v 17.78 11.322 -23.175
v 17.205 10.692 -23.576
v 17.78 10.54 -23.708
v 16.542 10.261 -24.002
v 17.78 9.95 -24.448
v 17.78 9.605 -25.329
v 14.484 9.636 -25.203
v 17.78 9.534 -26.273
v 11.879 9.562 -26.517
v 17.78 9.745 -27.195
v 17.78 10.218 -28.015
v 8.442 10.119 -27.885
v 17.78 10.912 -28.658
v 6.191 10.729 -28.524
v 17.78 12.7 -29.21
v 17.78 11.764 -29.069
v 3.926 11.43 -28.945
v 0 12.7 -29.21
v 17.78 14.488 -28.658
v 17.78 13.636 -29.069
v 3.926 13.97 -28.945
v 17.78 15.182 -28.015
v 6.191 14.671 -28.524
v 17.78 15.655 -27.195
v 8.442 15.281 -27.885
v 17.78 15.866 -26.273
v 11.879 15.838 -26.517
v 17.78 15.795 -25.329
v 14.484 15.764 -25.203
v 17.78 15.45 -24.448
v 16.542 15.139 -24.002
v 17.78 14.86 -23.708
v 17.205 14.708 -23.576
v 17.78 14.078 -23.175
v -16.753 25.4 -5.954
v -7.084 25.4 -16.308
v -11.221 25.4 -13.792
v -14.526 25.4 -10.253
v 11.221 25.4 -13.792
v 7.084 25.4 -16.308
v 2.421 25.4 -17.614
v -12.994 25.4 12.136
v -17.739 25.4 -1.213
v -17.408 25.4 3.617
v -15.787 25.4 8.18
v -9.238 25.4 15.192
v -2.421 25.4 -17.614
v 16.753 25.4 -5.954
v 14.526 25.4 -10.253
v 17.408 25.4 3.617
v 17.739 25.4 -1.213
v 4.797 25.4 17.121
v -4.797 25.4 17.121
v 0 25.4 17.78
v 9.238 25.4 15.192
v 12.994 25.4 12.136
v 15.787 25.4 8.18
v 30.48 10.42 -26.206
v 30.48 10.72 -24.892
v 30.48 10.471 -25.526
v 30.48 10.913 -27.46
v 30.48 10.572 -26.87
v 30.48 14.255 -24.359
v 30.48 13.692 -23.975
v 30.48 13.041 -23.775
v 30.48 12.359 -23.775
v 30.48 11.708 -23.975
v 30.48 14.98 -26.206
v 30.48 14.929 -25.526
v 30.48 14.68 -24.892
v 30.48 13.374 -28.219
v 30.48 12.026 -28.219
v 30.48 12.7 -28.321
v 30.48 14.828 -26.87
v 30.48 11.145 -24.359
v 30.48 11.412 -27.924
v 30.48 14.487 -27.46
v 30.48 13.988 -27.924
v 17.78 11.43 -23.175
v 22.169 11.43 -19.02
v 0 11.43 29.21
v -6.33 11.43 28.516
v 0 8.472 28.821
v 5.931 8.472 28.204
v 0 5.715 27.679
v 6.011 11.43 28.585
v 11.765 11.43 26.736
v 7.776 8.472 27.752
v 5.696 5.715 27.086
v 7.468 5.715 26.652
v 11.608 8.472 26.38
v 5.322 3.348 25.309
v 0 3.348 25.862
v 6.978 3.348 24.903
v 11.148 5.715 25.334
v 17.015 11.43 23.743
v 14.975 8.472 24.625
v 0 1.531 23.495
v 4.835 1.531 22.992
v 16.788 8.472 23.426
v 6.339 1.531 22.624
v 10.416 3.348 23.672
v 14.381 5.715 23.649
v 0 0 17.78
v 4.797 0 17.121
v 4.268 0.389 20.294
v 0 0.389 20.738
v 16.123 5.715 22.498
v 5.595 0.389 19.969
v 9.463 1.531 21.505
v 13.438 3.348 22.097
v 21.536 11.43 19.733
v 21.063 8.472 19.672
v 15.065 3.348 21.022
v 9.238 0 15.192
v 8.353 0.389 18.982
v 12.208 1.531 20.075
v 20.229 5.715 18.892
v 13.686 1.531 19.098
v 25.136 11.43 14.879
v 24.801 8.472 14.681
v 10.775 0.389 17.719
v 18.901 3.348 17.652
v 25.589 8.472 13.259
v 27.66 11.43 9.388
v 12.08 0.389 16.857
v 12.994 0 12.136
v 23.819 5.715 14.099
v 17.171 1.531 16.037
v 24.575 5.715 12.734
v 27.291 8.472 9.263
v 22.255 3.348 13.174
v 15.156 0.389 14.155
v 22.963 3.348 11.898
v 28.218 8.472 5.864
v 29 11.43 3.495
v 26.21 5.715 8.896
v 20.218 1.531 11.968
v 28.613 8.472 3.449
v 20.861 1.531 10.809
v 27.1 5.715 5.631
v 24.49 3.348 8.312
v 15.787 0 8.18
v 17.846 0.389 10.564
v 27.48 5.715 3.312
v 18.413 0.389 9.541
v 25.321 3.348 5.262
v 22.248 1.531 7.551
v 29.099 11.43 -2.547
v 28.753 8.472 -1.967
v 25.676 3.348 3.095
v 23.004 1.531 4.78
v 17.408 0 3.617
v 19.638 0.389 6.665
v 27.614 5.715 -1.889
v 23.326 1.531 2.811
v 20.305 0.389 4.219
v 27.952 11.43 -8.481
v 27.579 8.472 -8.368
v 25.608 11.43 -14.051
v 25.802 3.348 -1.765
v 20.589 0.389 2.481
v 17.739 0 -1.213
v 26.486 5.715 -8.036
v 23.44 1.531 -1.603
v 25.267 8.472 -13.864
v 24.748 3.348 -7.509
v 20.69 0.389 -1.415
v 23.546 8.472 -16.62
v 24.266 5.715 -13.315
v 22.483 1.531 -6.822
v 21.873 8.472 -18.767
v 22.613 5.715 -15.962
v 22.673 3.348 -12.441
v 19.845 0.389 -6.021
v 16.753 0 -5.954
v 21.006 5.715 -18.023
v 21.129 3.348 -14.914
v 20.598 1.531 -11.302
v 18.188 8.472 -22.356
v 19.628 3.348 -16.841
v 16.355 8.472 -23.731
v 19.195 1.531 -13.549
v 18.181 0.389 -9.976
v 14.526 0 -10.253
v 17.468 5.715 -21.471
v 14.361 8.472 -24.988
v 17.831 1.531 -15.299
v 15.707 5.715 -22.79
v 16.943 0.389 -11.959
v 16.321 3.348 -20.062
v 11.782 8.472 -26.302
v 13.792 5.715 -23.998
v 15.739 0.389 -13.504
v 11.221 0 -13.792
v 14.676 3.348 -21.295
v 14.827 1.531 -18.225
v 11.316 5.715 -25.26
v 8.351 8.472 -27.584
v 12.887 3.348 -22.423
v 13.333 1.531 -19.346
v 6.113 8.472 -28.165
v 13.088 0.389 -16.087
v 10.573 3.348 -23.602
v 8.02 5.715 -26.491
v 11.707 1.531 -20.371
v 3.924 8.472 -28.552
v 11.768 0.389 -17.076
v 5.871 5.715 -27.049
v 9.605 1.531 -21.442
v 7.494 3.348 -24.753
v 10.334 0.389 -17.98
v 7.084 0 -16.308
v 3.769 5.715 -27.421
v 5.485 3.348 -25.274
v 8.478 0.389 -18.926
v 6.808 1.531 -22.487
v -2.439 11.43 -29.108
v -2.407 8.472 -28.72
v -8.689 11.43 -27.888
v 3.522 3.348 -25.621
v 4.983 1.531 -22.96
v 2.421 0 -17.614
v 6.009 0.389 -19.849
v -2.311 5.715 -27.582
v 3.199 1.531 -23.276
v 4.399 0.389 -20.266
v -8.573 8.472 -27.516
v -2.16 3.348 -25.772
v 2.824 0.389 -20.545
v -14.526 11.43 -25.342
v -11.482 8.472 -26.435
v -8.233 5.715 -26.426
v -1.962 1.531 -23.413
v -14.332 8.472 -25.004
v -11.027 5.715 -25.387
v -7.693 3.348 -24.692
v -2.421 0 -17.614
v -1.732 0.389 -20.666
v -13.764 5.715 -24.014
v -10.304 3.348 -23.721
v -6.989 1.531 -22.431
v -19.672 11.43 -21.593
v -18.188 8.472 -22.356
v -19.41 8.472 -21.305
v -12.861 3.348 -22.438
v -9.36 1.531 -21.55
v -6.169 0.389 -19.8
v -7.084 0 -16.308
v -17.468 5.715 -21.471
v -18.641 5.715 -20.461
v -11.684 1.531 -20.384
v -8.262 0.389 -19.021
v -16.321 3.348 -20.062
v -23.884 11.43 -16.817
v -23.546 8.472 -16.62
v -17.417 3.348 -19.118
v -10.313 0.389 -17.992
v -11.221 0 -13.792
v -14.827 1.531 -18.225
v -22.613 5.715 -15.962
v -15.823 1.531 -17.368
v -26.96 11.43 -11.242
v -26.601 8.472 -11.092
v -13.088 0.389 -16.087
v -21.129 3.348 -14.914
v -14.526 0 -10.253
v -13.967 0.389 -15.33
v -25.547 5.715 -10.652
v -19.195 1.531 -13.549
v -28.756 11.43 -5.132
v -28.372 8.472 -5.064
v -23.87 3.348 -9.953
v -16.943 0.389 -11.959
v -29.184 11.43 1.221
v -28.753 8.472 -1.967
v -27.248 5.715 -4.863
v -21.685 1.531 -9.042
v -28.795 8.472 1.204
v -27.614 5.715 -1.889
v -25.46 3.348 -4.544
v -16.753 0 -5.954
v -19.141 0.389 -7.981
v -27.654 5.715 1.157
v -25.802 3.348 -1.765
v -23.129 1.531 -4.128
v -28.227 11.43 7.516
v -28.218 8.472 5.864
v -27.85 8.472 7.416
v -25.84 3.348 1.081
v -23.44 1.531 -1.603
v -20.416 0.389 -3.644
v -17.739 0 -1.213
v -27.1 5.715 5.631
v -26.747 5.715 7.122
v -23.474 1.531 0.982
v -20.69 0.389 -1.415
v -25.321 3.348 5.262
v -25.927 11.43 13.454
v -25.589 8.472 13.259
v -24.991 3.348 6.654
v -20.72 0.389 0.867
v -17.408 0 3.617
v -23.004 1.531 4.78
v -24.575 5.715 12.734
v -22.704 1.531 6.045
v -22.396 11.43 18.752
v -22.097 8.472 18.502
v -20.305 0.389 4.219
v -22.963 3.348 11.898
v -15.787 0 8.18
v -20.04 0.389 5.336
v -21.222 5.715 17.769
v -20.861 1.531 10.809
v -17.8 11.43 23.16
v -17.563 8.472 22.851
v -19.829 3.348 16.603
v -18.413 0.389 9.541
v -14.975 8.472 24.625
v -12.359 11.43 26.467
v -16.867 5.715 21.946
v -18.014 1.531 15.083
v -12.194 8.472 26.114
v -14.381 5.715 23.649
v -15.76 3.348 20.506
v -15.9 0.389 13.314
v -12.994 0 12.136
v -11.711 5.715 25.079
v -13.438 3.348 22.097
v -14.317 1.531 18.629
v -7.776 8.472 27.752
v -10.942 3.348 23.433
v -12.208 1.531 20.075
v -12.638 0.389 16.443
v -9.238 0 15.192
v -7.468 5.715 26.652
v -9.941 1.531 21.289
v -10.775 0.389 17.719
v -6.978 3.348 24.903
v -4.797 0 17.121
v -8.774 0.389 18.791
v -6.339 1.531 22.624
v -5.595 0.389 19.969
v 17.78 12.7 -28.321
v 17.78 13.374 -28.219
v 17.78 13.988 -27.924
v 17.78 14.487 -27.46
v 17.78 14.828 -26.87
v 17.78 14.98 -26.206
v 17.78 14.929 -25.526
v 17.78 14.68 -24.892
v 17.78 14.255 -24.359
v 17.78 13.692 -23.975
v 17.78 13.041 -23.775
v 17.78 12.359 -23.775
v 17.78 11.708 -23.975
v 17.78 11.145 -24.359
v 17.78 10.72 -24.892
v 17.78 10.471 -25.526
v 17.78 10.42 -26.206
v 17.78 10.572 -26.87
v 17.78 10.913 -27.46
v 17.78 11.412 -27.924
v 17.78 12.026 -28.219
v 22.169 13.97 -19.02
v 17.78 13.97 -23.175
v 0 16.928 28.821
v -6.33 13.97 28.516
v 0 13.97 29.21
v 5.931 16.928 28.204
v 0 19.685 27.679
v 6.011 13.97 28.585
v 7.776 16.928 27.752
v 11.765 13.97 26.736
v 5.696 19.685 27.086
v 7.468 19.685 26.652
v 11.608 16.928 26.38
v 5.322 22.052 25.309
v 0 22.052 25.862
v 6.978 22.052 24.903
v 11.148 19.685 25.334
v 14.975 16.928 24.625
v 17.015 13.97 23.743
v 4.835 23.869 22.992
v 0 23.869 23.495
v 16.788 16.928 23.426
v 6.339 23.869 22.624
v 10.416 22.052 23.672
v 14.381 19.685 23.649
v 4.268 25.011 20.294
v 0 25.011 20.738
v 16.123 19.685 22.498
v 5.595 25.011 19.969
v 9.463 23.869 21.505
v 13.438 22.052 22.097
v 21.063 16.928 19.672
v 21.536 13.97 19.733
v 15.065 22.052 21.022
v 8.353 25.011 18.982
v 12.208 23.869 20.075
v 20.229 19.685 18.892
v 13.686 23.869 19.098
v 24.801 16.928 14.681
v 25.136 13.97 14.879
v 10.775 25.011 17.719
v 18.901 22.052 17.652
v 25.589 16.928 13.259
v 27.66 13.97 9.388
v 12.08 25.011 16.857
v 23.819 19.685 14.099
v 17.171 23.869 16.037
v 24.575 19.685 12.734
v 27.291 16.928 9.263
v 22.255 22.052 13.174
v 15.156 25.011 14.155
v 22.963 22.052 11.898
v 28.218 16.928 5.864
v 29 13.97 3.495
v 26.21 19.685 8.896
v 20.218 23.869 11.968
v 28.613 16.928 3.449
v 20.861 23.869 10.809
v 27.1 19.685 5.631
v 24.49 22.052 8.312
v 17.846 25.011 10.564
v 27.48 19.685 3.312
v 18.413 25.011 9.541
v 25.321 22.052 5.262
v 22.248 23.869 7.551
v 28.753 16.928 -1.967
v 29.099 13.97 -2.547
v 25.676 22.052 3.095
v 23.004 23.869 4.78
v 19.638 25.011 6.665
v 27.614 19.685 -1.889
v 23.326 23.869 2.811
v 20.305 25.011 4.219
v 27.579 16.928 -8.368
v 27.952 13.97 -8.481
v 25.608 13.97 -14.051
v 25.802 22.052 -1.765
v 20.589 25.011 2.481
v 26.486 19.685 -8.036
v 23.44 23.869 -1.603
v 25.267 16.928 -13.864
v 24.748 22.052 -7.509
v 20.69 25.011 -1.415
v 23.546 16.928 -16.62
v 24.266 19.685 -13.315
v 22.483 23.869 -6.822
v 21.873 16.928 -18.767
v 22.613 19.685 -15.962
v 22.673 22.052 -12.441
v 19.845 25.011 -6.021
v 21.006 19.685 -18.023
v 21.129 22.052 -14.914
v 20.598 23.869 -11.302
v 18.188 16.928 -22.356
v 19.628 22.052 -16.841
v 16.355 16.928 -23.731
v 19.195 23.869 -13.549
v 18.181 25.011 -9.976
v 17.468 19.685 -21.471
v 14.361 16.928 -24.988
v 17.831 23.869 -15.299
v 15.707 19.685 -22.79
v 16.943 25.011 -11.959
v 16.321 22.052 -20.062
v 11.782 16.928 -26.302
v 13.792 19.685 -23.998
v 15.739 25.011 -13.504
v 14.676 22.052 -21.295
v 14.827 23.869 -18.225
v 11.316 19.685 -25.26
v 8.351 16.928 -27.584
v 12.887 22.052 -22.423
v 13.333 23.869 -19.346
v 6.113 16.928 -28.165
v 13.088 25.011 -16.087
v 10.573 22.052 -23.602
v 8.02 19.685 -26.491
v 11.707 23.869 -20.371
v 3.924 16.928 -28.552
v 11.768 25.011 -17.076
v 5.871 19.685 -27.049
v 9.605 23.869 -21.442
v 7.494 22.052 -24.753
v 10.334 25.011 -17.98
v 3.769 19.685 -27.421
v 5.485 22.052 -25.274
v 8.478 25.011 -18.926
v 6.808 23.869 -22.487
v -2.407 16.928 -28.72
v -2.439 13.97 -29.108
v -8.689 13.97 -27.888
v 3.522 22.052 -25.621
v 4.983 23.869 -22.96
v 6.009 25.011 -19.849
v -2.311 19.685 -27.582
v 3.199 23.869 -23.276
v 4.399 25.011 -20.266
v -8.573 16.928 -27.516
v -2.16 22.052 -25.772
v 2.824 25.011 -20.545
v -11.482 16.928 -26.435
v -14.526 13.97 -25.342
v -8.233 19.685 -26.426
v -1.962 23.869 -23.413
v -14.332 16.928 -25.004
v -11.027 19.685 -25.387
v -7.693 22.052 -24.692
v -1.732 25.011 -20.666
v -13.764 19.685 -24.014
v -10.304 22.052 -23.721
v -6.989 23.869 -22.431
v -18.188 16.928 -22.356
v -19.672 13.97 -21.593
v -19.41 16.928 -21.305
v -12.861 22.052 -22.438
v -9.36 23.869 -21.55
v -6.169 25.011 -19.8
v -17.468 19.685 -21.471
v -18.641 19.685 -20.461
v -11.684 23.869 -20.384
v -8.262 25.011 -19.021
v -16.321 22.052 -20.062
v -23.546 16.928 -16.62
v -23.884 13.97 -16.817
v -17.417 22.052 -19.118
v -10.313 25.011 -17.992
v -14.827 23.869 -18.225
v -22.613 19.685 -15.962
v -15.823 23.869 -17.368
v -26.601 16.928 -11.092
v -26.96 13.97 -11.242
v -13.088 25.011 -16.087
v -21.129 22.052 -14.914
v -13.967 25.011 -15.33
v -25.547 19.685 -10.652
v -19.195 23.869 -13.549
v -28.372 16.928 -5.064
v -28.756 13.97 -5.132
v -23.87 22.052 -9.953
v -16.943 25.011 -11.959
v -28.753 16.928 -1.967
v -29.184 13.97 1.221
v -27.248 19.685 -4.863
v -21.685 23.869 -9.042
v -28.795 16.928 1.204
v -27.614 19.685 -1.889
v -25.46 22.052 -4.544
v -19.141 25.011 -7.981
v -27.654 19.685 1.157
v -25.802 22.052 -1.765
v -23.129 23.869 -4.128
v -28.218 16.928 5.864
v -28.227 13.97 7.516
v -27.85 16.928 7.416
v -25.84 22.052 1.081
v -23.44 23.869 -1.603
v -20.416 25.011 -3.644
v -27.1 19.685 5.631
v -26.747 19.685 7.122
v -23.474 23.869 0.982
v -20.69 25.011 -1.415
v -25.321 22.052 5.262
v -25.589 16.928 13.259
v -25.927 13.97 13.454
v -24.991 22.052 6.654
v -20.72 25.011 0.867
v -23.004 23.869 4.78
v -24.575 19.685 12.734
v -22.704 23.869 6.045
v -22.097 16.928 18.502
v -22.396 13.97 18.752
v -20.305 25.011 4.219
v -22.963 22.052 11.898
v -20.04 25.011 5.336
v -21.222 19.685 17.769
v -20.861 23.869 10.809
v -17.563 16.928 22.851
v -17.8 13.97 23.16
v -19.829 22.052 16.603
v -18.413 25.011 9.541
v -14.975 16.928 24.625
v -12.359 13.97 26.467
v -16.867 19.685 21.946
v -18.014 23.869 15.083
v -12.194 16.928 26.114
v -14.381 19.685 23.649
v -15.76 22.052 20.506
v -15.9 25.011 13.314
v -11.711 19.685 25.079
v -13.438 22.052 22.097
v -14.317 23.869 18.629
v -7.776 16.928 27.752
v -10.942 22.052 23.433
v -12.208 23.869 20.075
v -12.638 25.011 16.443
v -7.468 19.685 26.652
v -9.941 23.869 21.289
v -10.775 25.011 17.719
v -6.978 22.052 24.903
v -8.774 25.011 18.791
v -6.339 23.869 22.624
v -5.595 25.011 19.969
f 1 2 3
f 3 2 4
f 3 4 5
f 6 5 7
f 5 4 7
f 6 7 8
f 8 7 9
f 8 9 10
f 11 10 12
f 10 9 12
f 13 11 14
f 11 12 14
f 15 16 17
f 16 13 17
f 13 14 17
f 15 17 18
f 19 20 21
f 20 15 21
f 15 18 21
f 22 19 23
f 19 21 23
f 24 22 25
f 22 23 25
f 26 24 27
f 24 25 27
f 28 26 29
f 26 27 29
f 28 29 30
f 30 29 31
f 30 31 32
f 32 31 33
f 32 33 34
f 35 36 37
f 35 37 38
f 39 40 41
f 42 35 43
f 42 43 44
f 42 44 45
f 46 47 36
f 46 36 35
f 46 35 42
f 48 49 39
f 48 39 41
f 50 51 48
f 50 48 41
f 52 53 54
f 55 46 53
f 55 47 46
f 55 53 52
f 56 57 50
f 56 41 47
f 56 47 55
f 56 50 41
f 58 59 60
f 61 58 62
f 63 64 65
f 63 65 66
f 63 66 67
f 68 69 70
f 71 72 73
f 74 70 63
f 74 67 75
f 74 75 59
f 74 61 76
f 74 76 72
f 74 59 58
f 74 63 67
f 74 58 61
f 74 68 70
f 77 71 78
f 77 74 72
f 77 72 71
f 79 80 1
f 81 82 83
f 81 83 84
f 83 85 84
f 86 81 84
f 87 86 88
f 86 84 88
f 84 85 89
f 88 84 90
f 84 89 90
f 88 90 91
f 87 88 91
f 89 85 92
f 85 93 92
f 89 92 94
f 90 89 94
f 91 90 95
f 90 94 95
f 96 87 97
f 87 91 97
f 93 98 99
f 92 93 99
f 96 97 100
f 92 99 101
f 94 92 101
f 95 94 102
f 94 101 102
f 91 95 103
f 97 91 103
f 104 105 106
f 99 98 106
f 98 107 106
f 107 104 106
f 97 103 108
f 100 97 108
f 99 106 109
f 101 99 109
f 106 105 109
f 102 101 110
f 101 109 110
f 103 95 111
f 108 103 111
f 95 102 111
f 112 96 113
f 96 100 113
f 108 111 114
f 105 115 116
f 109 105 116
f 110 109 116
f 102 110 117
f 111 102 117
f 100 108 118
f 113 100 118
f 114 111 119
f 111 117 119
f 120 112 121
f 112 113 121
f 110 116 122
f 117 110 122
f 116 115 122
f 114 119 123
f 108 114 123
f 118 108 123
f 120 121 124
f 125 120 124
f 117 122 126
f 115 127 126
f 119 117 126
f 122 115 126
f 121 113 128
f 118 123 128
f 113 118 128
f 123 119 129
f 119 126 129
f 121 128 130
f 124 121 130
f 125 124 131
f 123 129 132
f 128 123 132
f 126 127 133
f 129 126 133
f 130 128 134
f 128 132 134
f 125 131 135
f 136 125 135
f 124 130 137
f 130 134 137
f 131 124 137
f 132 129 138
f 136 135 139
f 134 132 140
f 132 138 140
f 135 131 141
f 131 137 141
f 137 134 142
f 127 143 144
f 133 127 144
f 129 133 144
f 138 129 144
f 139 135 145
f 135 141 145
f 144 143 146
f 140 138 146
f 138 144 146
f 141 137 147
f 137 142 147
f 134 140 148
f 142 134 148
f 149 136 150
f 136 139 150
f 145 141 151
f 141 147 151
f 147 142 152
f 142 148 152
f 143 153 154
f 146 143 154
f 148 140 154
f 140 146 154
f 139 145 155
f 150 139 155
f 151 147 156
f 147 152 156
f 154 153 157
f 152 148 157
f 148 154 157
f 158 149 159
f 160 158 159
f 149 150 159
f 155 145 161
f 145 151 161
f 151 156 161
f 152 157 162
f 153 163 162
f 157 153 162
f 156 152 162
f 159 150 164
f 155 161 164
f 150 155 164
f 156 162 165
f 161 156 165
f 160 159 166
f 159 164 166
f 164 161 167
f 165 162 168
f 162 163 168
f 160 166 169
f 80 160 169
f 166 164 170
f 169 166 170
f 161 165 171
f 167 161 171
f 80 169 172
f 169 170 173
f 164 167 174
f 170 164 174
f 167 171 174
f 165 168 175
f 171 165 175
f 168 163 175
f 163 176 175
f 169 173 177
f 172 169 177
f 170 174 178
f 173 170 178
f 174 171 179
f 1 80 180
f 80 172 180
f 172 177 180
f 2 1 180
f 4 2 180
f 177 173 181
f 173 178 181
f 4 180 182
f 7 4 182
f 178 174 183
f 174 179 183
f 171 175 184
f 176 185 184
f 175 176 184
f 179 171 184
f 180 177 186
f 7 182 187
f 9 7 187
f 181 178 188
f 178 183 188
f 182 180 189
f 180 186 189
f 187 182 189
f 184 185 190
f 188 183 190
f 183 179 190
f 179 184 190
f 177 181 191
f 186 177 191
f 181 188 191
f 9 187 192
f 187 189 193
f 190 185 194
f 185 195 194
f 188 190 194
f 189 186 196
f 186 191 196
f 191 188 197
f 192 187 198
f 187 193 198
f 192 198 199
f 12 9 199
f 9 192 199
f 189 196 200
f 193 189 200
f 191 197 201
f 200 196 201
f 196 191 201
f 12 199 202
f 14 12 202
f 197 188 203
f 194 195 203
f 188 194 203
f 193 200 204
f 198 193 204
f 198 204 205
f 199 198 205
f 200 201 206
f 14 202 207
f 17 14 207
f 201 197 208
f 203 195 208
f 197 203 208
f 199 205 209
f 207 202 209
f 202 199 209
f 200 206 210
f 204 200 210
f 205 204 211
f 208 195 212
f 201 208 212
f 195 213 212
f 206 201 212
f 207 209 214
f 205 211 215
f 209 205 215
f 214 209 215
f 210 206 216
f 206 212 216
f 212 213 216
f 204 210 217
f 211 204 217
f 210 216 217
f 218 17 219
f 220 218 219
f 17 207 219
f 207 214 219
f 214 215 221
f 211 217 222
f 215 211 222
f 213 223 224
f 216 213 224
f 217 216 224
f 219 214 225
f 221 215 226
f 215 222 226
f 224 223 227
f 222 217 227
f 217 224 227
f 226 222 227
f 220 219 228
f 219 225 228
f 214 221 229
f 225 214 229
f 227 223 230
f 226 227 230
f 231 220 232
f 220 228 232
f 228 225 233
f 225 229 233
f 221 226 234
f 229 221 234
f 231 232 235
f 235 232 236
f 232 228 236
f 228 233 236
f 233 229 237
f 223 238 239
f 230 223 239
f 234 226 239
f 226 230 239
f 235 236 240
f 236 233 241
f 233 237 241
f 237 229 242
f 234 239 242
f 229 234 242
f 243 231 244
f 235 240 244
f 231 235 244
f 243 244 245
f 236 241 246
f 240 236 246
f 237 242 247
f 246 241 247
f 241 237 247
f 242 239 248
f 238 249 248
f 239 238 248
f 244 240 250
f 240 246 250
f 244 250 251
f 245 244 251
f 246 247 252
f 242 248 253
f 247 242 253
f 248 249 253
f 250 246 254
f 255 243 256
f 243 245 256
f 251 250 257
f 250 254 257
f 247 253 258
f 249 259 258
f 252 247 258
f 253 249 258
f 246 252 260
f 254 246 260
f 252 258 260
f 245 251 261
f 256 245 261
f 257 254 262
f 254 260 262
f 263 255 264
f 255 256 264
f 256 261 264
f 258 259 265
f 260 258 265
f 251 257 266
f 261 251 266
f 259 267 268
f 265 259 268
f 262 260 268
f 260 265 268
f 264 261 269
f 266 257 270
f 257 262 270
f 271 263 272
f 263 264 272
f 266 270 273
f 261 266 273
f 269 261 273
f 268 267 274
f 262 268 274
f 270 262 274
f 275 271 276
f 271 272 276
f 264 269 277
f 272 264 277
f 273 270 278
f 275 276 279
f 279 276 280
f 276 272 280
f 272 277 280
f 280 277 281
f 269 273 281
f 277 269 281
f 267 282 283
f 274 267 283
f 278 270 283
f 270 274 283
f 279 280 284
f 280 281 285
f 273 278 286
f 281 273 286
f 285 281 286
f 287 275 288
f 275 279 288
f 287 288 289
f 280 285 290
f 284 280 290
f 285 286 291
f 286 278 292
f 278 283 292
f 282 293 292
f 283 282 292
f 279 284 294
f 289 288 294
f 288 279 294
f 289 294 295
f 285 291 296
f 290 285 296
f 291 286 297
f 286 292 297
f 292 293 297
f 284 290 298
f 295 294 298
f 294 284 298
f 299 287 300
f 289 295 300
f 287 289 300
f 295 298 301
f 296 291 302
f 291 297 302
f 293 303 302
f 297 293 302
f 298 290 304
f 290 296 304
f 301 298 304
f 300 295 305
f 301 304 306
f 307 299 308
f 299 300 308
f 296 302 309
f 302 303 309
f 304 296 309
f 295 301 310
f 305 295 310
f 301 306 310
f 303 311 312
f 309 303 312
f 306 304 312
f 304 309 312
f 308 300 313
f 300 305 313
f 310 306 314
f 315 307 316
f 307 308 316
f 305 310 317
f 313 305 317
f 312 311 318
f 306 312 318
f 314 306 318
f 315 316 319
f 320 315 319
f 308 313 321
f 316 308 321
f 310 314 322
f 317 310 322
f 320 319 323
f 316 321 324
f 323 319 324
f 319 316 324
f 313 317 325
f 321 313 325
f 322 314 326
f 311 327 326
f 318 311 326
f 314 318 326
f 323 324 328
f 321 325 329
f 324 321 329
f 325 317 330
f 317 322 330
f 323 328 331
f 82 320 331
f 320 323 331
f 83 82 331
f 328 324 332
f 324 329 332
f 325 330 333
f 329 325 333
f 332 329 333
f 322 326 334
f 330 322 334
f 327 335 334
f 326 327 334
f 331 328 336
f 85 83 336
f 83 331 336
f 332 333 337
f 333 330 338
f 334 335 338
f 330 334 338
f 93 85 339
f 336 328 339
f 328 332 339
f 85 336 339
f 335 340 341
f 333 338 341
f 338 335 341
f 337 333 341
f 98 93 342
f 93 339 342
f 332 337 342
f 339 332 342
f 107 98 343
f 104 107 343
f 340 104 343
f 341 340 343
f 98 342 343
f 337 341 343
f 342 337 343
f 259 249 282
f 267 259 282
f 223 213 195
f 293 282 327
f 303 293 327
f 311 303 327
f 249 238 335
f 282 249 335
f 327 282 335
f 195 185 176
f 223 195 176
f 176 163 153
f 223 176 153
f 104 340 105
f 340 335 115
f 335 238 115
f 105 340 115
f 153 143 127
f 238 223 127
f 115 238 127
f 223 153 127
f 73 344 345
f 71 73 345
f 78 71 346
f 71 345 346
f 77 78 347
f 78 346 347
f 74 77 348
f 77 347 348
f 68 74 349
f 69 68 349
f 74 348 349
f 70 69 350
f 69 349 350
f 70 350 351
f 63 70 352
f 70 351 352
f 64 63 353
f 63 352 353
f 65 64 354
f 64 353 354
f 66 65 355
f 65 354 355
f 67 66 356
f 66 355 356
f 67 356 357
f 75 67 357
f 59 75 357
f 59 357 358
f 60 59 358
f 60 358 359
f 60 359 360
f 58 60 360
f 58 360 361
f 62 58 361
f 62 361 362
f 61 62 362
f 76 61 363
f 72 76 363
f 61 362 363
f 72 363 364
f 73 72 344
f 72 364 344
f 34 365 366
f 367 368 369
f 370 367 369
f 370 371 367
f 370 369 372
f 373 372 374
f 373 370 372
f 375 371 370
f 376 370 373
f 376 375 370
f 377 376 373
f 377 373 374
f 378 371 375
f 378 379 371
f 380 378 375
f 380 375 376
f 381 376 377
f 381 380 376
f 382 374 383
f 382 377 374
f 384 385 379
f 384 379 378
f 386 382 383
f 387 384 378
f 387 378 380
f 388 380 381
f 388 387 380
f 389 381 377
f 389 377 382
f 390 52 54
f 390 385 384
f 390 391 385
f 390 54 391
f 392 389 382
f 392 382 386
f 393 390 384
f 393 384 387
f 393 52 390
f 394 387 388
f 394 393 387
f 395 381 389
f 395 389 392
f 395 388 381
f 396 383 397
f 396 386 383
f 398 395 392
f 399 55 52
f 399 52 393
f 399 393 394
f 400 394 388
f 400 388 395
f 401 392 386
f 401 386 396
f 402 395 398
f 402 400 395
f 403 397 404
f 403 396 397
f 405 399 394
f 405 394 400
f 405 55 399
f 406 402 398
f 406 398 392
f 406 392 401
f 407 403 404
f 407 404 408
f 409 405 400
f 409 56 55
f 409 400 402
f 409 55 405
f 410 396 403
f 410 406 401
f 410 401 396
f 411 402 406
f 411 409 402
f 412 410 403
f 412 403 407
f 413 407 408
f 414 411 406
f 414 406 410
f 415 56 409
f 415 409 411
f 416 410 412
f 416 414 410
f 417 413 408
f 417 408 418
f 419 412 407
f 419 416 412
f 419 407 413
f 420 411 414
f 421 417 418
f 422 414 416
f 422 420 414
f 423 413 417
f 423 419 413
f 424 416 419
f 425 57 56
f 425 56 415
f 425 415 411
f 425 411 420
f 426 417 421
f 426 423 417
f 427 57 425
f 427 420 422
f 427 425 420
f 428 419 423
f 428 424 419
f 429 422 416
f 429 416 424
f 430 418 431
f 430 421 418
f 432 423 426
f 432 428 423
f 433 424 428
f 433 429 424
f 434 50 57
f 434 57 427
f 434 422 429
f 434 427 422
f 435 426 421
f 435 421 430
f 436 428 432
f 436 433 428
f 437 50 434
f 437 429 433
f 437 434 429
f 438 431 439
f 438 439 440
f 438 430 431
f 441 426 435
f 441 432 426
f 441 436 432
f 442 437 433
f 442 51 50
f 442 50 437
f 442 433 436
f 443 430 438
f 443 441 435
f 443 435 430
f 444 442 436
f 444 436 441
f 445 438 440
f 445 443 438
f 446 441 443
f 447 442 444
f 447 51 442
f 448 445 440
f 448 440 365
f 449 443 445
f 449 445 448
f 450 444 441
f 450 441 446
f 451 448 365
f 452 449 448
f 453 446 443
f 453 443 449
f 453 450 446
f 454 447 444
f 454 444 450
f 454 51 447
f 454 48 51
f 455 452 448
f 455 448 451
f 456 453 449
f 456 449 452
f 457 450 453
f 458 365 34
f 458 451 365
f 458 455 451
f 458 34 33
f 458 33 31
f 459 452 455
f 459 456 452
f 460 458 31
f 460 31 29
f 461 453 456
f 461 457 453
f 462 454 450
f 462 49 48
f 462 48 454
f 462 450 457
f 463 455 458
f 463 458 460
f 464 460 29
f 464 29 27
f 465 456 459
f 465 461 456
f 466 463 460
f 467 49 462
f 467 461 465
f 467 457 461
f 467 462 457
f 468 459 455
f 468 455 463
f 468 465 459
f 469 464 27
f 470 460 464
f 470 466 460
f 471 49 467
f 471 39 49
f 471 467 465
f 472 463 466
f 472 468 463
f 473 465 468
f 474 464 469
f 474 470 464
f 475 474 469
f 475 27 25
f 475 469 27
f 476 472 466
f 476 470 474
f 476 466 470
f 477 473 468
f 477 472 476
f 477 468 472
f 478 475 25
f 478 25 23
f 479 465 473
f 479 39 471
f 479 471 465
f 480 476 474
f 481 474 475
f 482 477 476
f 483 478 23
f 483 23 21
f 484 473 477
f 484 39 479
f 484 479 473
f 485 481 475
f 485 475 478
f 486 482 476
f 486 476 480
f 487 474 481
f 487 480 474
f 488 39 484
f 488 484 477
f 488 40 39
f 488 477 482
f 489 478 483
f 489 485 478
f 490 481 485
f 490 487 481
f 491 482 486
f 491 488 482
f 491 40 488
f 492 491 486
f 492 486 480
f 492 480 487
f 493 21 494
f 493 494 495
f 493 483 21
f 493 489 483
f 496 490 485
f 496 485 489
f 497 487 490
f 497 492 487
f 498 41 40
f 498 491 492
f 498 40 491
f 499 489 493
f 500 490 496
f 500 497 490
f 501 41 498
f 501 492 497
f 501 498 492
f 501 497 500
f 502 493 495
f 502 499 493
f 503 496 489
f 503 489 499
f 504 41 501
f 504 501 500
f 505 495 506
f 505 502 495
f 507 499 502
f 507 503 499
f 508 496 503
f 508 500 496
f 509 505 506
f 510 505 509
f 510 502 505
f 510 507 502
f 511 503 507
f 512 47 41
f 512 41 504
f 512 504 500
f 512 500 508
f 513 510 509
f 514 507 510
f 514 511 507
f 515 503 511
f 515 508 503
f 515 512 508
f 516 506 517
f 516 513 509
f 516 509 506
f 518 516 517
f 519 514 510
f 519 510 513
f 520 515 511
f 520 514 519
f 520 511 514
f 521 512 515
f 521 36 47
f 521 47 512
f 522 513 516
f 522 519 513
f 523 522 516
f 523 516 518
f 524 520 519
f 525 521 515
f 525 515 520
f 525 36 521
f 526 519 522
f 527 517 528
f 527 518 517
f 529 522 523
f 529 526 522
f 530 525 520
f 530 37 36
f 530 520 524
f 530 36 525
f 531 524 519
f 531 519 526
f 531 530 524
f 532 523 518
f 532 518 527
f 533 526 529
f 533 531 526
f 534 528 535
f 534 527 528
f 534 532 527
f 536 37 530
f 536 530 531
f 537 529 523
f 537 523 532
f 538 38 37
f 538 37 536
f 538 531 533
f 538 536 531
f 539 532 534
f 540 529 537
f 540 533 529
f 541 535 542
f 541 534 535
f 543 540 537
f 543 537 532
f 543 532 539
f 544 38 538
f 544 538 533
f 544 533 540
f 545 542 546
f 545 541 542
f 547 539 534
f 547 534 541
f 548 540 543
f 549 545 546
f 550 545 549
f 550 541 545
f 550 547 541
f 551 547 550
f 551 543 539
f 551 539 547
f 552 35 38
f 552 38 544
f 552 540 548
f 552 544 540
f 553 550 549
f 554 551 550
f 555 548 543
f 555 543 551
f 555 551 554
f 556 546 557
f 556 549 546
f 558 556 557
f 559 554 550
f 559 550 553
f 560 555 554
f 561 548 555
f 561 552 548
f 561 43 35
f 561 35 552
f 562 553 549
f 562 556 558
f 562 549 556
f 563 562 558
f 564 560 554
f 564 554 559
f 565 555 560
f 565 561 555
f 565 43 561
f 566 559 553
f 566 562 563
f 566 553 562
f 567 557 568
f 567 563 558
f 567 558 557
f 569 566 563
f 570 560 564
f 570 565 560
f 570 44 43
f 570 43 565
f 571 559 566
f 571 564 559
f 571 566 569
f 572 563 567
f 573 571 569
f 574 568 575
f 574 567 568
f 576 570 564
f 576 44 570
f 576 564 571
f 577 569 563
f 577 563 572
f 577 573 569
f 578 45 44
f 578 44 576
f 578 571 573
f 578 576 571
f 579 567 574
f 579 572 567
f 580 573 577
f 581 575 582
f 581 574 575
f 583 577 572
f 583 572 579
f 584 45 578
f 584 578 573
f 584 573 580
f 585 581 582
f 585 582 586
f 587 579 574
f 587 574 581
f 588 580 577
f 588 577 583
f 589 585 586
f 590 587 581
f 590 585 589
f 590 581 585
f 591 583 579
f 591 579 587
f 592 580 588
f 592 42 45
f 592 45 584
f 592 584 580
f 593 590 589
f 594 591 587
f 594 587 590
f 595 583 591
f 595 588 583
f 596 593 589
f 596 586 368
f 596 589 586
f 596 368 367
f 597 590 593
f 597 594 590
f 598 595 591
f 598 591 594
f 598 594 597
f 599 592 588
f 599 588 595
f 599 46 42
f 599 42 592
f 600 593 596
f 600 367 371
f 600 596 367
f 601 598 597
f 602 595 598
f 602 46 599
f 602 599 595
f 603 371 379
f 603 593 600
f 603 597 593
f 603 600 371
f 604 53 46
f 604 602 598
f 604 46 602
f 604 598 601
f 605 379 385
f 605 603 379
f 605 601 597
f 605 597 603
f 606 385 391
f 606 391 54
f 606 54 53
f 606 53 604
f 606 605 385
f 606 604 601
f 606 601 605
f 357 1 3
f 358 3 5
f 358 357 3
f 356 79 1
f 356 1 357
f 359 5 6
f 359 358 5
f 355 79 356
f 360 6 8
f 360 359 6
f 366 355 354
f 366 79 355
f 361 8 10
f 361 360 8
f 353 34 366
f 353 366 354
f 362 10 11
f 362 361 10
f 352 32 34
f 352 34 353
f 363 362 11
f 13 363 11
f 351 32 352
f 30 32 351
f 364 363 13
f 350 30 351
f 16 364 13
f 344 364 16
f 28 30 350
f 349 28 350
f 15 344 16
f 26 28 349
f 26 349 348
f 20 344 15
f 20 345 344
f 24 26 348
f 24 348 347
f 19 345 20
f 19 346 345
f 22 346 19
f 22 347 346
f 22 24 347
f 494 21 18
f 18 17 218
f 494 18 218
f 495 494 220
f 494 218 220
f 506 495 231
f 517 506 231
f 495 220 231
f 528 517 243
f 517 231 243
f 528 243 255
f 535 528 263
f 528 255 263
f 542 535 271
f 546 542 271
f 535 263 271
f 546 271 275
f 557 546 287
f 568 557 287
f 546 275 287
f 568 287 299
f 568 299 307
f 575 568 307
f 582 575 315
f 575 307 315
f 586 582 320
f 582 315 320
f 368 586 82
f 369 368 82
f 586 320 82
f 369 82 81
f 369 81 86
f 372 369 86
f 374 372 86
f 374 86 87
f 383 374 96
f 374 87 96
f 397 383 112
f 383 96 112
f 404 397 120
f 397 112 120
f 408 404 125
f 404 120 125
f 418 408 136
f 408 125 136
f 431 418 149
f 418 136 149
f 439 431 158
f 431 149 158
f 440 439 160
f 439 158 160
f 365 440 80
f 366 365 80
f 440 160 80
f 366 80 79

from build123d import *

# Parameters (mm, degrees)
SKETCH1_R           = 29.21
BOSS_EXTRUDE1_DEPTH = 25.4
FILLET1_R           = 11.43
SKETCH2_R           = 3.175
BOSS_EXTRUDE2_DEPTH = 17.78
SKETCH3_R           = 2.286
BOSS_EXTRUDE3_DEPTH = 12.7


with BuildPart() as part:
    # Sketch1 → Boss-Extrude1 (new body)
    with BuildSketch(Plane(origin=(0, 0, 0), x_dir=(1, 0, 0), z_dir=(0, 1, 0))):
        with Locations(Location((0, 0, 0), (0, 0, 270))):
            Circle(SKETCH1_R)
    extrude(amount=BOSS_EXTRUDE1_DEPTH)

    # Fillet1
    fillet1_edges = [part.edges().sort_by_distance(p)[0] for p in [
        (0, 0, -29.21),
        (0, 25.4, -29.21),
    ]]
    fillet(fillet1_edges, radius=FILLET1_R)

    # Sketch2 → Boss-Extrude2 (add)
    with BuildSketch(Plane(origin=(0, 0, 0), x_dir=(0, 0, -1), z_dir=(1, 0, 0))):
        with Locations((26.035, 12.7)):
            Circle(SKETCH2_R)
    extrude(amount=BOSS_EXTRUDE2_DEPTH)

    # Sketch3 → Boss-Extrude3 (add)
    with BuildSketch(Plane(origin=(17.78, 0, 0), x_dir=(0, 0, -1), z_dir=(1, 0, 0))):
        with Locations((26.035, 12.7)):
            Circle(SKETCH3_R)
    extrude(amount=BOSS_EXTRUDE3_DEPTH)


solid = part.part
